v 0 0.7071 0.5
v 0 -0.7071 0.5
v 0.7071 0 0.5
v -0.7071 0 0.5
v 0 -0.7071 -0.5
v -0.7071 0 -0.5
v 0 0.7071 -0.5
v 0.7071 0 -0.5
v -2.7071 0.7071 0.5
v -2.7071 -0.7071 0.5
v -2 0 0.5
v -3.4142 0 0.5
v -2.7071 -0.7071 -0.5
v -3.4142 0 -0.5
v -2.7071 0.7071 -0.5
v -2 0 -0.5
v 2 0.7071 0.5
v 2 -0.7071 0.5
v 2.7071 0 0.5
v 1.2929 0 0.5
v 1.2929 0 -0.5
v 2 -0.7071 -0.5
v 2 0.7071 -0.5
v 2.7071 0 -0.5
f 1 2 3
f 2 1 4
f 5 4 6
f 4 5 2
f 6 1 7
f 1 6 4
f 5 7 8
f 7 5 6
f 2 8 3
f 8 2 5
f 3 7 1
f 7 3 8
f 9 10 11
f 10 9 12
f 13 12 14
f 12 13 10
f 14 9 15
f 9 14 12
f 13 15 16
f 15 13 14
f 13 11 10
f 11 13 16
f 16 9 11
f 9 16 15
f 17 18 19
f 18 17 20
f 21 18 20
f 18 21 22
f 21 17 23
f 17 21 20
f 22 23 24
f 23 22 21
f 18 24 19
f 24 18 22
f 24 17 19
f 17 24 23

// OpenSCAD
$fn=5;
union()
{
	translate([0.000000059604645,-0.70710677,-0.5])
	{
		rotate(45.000004,[0,0,1])
		{
			cube([1,1,1]);
		}
	}
	translate([-2.7071066,-0.70710677,-0.5])
	{
		rotate(45.000004,[0,0,1])
		{
			cube([1,1,1]);
		}
	}
	translate([2,-0.70710677,-0.5])
	{
		rotate(45.000004,[0,0,1])
		{
			cube([1,1,1]);
		}
	}
}
